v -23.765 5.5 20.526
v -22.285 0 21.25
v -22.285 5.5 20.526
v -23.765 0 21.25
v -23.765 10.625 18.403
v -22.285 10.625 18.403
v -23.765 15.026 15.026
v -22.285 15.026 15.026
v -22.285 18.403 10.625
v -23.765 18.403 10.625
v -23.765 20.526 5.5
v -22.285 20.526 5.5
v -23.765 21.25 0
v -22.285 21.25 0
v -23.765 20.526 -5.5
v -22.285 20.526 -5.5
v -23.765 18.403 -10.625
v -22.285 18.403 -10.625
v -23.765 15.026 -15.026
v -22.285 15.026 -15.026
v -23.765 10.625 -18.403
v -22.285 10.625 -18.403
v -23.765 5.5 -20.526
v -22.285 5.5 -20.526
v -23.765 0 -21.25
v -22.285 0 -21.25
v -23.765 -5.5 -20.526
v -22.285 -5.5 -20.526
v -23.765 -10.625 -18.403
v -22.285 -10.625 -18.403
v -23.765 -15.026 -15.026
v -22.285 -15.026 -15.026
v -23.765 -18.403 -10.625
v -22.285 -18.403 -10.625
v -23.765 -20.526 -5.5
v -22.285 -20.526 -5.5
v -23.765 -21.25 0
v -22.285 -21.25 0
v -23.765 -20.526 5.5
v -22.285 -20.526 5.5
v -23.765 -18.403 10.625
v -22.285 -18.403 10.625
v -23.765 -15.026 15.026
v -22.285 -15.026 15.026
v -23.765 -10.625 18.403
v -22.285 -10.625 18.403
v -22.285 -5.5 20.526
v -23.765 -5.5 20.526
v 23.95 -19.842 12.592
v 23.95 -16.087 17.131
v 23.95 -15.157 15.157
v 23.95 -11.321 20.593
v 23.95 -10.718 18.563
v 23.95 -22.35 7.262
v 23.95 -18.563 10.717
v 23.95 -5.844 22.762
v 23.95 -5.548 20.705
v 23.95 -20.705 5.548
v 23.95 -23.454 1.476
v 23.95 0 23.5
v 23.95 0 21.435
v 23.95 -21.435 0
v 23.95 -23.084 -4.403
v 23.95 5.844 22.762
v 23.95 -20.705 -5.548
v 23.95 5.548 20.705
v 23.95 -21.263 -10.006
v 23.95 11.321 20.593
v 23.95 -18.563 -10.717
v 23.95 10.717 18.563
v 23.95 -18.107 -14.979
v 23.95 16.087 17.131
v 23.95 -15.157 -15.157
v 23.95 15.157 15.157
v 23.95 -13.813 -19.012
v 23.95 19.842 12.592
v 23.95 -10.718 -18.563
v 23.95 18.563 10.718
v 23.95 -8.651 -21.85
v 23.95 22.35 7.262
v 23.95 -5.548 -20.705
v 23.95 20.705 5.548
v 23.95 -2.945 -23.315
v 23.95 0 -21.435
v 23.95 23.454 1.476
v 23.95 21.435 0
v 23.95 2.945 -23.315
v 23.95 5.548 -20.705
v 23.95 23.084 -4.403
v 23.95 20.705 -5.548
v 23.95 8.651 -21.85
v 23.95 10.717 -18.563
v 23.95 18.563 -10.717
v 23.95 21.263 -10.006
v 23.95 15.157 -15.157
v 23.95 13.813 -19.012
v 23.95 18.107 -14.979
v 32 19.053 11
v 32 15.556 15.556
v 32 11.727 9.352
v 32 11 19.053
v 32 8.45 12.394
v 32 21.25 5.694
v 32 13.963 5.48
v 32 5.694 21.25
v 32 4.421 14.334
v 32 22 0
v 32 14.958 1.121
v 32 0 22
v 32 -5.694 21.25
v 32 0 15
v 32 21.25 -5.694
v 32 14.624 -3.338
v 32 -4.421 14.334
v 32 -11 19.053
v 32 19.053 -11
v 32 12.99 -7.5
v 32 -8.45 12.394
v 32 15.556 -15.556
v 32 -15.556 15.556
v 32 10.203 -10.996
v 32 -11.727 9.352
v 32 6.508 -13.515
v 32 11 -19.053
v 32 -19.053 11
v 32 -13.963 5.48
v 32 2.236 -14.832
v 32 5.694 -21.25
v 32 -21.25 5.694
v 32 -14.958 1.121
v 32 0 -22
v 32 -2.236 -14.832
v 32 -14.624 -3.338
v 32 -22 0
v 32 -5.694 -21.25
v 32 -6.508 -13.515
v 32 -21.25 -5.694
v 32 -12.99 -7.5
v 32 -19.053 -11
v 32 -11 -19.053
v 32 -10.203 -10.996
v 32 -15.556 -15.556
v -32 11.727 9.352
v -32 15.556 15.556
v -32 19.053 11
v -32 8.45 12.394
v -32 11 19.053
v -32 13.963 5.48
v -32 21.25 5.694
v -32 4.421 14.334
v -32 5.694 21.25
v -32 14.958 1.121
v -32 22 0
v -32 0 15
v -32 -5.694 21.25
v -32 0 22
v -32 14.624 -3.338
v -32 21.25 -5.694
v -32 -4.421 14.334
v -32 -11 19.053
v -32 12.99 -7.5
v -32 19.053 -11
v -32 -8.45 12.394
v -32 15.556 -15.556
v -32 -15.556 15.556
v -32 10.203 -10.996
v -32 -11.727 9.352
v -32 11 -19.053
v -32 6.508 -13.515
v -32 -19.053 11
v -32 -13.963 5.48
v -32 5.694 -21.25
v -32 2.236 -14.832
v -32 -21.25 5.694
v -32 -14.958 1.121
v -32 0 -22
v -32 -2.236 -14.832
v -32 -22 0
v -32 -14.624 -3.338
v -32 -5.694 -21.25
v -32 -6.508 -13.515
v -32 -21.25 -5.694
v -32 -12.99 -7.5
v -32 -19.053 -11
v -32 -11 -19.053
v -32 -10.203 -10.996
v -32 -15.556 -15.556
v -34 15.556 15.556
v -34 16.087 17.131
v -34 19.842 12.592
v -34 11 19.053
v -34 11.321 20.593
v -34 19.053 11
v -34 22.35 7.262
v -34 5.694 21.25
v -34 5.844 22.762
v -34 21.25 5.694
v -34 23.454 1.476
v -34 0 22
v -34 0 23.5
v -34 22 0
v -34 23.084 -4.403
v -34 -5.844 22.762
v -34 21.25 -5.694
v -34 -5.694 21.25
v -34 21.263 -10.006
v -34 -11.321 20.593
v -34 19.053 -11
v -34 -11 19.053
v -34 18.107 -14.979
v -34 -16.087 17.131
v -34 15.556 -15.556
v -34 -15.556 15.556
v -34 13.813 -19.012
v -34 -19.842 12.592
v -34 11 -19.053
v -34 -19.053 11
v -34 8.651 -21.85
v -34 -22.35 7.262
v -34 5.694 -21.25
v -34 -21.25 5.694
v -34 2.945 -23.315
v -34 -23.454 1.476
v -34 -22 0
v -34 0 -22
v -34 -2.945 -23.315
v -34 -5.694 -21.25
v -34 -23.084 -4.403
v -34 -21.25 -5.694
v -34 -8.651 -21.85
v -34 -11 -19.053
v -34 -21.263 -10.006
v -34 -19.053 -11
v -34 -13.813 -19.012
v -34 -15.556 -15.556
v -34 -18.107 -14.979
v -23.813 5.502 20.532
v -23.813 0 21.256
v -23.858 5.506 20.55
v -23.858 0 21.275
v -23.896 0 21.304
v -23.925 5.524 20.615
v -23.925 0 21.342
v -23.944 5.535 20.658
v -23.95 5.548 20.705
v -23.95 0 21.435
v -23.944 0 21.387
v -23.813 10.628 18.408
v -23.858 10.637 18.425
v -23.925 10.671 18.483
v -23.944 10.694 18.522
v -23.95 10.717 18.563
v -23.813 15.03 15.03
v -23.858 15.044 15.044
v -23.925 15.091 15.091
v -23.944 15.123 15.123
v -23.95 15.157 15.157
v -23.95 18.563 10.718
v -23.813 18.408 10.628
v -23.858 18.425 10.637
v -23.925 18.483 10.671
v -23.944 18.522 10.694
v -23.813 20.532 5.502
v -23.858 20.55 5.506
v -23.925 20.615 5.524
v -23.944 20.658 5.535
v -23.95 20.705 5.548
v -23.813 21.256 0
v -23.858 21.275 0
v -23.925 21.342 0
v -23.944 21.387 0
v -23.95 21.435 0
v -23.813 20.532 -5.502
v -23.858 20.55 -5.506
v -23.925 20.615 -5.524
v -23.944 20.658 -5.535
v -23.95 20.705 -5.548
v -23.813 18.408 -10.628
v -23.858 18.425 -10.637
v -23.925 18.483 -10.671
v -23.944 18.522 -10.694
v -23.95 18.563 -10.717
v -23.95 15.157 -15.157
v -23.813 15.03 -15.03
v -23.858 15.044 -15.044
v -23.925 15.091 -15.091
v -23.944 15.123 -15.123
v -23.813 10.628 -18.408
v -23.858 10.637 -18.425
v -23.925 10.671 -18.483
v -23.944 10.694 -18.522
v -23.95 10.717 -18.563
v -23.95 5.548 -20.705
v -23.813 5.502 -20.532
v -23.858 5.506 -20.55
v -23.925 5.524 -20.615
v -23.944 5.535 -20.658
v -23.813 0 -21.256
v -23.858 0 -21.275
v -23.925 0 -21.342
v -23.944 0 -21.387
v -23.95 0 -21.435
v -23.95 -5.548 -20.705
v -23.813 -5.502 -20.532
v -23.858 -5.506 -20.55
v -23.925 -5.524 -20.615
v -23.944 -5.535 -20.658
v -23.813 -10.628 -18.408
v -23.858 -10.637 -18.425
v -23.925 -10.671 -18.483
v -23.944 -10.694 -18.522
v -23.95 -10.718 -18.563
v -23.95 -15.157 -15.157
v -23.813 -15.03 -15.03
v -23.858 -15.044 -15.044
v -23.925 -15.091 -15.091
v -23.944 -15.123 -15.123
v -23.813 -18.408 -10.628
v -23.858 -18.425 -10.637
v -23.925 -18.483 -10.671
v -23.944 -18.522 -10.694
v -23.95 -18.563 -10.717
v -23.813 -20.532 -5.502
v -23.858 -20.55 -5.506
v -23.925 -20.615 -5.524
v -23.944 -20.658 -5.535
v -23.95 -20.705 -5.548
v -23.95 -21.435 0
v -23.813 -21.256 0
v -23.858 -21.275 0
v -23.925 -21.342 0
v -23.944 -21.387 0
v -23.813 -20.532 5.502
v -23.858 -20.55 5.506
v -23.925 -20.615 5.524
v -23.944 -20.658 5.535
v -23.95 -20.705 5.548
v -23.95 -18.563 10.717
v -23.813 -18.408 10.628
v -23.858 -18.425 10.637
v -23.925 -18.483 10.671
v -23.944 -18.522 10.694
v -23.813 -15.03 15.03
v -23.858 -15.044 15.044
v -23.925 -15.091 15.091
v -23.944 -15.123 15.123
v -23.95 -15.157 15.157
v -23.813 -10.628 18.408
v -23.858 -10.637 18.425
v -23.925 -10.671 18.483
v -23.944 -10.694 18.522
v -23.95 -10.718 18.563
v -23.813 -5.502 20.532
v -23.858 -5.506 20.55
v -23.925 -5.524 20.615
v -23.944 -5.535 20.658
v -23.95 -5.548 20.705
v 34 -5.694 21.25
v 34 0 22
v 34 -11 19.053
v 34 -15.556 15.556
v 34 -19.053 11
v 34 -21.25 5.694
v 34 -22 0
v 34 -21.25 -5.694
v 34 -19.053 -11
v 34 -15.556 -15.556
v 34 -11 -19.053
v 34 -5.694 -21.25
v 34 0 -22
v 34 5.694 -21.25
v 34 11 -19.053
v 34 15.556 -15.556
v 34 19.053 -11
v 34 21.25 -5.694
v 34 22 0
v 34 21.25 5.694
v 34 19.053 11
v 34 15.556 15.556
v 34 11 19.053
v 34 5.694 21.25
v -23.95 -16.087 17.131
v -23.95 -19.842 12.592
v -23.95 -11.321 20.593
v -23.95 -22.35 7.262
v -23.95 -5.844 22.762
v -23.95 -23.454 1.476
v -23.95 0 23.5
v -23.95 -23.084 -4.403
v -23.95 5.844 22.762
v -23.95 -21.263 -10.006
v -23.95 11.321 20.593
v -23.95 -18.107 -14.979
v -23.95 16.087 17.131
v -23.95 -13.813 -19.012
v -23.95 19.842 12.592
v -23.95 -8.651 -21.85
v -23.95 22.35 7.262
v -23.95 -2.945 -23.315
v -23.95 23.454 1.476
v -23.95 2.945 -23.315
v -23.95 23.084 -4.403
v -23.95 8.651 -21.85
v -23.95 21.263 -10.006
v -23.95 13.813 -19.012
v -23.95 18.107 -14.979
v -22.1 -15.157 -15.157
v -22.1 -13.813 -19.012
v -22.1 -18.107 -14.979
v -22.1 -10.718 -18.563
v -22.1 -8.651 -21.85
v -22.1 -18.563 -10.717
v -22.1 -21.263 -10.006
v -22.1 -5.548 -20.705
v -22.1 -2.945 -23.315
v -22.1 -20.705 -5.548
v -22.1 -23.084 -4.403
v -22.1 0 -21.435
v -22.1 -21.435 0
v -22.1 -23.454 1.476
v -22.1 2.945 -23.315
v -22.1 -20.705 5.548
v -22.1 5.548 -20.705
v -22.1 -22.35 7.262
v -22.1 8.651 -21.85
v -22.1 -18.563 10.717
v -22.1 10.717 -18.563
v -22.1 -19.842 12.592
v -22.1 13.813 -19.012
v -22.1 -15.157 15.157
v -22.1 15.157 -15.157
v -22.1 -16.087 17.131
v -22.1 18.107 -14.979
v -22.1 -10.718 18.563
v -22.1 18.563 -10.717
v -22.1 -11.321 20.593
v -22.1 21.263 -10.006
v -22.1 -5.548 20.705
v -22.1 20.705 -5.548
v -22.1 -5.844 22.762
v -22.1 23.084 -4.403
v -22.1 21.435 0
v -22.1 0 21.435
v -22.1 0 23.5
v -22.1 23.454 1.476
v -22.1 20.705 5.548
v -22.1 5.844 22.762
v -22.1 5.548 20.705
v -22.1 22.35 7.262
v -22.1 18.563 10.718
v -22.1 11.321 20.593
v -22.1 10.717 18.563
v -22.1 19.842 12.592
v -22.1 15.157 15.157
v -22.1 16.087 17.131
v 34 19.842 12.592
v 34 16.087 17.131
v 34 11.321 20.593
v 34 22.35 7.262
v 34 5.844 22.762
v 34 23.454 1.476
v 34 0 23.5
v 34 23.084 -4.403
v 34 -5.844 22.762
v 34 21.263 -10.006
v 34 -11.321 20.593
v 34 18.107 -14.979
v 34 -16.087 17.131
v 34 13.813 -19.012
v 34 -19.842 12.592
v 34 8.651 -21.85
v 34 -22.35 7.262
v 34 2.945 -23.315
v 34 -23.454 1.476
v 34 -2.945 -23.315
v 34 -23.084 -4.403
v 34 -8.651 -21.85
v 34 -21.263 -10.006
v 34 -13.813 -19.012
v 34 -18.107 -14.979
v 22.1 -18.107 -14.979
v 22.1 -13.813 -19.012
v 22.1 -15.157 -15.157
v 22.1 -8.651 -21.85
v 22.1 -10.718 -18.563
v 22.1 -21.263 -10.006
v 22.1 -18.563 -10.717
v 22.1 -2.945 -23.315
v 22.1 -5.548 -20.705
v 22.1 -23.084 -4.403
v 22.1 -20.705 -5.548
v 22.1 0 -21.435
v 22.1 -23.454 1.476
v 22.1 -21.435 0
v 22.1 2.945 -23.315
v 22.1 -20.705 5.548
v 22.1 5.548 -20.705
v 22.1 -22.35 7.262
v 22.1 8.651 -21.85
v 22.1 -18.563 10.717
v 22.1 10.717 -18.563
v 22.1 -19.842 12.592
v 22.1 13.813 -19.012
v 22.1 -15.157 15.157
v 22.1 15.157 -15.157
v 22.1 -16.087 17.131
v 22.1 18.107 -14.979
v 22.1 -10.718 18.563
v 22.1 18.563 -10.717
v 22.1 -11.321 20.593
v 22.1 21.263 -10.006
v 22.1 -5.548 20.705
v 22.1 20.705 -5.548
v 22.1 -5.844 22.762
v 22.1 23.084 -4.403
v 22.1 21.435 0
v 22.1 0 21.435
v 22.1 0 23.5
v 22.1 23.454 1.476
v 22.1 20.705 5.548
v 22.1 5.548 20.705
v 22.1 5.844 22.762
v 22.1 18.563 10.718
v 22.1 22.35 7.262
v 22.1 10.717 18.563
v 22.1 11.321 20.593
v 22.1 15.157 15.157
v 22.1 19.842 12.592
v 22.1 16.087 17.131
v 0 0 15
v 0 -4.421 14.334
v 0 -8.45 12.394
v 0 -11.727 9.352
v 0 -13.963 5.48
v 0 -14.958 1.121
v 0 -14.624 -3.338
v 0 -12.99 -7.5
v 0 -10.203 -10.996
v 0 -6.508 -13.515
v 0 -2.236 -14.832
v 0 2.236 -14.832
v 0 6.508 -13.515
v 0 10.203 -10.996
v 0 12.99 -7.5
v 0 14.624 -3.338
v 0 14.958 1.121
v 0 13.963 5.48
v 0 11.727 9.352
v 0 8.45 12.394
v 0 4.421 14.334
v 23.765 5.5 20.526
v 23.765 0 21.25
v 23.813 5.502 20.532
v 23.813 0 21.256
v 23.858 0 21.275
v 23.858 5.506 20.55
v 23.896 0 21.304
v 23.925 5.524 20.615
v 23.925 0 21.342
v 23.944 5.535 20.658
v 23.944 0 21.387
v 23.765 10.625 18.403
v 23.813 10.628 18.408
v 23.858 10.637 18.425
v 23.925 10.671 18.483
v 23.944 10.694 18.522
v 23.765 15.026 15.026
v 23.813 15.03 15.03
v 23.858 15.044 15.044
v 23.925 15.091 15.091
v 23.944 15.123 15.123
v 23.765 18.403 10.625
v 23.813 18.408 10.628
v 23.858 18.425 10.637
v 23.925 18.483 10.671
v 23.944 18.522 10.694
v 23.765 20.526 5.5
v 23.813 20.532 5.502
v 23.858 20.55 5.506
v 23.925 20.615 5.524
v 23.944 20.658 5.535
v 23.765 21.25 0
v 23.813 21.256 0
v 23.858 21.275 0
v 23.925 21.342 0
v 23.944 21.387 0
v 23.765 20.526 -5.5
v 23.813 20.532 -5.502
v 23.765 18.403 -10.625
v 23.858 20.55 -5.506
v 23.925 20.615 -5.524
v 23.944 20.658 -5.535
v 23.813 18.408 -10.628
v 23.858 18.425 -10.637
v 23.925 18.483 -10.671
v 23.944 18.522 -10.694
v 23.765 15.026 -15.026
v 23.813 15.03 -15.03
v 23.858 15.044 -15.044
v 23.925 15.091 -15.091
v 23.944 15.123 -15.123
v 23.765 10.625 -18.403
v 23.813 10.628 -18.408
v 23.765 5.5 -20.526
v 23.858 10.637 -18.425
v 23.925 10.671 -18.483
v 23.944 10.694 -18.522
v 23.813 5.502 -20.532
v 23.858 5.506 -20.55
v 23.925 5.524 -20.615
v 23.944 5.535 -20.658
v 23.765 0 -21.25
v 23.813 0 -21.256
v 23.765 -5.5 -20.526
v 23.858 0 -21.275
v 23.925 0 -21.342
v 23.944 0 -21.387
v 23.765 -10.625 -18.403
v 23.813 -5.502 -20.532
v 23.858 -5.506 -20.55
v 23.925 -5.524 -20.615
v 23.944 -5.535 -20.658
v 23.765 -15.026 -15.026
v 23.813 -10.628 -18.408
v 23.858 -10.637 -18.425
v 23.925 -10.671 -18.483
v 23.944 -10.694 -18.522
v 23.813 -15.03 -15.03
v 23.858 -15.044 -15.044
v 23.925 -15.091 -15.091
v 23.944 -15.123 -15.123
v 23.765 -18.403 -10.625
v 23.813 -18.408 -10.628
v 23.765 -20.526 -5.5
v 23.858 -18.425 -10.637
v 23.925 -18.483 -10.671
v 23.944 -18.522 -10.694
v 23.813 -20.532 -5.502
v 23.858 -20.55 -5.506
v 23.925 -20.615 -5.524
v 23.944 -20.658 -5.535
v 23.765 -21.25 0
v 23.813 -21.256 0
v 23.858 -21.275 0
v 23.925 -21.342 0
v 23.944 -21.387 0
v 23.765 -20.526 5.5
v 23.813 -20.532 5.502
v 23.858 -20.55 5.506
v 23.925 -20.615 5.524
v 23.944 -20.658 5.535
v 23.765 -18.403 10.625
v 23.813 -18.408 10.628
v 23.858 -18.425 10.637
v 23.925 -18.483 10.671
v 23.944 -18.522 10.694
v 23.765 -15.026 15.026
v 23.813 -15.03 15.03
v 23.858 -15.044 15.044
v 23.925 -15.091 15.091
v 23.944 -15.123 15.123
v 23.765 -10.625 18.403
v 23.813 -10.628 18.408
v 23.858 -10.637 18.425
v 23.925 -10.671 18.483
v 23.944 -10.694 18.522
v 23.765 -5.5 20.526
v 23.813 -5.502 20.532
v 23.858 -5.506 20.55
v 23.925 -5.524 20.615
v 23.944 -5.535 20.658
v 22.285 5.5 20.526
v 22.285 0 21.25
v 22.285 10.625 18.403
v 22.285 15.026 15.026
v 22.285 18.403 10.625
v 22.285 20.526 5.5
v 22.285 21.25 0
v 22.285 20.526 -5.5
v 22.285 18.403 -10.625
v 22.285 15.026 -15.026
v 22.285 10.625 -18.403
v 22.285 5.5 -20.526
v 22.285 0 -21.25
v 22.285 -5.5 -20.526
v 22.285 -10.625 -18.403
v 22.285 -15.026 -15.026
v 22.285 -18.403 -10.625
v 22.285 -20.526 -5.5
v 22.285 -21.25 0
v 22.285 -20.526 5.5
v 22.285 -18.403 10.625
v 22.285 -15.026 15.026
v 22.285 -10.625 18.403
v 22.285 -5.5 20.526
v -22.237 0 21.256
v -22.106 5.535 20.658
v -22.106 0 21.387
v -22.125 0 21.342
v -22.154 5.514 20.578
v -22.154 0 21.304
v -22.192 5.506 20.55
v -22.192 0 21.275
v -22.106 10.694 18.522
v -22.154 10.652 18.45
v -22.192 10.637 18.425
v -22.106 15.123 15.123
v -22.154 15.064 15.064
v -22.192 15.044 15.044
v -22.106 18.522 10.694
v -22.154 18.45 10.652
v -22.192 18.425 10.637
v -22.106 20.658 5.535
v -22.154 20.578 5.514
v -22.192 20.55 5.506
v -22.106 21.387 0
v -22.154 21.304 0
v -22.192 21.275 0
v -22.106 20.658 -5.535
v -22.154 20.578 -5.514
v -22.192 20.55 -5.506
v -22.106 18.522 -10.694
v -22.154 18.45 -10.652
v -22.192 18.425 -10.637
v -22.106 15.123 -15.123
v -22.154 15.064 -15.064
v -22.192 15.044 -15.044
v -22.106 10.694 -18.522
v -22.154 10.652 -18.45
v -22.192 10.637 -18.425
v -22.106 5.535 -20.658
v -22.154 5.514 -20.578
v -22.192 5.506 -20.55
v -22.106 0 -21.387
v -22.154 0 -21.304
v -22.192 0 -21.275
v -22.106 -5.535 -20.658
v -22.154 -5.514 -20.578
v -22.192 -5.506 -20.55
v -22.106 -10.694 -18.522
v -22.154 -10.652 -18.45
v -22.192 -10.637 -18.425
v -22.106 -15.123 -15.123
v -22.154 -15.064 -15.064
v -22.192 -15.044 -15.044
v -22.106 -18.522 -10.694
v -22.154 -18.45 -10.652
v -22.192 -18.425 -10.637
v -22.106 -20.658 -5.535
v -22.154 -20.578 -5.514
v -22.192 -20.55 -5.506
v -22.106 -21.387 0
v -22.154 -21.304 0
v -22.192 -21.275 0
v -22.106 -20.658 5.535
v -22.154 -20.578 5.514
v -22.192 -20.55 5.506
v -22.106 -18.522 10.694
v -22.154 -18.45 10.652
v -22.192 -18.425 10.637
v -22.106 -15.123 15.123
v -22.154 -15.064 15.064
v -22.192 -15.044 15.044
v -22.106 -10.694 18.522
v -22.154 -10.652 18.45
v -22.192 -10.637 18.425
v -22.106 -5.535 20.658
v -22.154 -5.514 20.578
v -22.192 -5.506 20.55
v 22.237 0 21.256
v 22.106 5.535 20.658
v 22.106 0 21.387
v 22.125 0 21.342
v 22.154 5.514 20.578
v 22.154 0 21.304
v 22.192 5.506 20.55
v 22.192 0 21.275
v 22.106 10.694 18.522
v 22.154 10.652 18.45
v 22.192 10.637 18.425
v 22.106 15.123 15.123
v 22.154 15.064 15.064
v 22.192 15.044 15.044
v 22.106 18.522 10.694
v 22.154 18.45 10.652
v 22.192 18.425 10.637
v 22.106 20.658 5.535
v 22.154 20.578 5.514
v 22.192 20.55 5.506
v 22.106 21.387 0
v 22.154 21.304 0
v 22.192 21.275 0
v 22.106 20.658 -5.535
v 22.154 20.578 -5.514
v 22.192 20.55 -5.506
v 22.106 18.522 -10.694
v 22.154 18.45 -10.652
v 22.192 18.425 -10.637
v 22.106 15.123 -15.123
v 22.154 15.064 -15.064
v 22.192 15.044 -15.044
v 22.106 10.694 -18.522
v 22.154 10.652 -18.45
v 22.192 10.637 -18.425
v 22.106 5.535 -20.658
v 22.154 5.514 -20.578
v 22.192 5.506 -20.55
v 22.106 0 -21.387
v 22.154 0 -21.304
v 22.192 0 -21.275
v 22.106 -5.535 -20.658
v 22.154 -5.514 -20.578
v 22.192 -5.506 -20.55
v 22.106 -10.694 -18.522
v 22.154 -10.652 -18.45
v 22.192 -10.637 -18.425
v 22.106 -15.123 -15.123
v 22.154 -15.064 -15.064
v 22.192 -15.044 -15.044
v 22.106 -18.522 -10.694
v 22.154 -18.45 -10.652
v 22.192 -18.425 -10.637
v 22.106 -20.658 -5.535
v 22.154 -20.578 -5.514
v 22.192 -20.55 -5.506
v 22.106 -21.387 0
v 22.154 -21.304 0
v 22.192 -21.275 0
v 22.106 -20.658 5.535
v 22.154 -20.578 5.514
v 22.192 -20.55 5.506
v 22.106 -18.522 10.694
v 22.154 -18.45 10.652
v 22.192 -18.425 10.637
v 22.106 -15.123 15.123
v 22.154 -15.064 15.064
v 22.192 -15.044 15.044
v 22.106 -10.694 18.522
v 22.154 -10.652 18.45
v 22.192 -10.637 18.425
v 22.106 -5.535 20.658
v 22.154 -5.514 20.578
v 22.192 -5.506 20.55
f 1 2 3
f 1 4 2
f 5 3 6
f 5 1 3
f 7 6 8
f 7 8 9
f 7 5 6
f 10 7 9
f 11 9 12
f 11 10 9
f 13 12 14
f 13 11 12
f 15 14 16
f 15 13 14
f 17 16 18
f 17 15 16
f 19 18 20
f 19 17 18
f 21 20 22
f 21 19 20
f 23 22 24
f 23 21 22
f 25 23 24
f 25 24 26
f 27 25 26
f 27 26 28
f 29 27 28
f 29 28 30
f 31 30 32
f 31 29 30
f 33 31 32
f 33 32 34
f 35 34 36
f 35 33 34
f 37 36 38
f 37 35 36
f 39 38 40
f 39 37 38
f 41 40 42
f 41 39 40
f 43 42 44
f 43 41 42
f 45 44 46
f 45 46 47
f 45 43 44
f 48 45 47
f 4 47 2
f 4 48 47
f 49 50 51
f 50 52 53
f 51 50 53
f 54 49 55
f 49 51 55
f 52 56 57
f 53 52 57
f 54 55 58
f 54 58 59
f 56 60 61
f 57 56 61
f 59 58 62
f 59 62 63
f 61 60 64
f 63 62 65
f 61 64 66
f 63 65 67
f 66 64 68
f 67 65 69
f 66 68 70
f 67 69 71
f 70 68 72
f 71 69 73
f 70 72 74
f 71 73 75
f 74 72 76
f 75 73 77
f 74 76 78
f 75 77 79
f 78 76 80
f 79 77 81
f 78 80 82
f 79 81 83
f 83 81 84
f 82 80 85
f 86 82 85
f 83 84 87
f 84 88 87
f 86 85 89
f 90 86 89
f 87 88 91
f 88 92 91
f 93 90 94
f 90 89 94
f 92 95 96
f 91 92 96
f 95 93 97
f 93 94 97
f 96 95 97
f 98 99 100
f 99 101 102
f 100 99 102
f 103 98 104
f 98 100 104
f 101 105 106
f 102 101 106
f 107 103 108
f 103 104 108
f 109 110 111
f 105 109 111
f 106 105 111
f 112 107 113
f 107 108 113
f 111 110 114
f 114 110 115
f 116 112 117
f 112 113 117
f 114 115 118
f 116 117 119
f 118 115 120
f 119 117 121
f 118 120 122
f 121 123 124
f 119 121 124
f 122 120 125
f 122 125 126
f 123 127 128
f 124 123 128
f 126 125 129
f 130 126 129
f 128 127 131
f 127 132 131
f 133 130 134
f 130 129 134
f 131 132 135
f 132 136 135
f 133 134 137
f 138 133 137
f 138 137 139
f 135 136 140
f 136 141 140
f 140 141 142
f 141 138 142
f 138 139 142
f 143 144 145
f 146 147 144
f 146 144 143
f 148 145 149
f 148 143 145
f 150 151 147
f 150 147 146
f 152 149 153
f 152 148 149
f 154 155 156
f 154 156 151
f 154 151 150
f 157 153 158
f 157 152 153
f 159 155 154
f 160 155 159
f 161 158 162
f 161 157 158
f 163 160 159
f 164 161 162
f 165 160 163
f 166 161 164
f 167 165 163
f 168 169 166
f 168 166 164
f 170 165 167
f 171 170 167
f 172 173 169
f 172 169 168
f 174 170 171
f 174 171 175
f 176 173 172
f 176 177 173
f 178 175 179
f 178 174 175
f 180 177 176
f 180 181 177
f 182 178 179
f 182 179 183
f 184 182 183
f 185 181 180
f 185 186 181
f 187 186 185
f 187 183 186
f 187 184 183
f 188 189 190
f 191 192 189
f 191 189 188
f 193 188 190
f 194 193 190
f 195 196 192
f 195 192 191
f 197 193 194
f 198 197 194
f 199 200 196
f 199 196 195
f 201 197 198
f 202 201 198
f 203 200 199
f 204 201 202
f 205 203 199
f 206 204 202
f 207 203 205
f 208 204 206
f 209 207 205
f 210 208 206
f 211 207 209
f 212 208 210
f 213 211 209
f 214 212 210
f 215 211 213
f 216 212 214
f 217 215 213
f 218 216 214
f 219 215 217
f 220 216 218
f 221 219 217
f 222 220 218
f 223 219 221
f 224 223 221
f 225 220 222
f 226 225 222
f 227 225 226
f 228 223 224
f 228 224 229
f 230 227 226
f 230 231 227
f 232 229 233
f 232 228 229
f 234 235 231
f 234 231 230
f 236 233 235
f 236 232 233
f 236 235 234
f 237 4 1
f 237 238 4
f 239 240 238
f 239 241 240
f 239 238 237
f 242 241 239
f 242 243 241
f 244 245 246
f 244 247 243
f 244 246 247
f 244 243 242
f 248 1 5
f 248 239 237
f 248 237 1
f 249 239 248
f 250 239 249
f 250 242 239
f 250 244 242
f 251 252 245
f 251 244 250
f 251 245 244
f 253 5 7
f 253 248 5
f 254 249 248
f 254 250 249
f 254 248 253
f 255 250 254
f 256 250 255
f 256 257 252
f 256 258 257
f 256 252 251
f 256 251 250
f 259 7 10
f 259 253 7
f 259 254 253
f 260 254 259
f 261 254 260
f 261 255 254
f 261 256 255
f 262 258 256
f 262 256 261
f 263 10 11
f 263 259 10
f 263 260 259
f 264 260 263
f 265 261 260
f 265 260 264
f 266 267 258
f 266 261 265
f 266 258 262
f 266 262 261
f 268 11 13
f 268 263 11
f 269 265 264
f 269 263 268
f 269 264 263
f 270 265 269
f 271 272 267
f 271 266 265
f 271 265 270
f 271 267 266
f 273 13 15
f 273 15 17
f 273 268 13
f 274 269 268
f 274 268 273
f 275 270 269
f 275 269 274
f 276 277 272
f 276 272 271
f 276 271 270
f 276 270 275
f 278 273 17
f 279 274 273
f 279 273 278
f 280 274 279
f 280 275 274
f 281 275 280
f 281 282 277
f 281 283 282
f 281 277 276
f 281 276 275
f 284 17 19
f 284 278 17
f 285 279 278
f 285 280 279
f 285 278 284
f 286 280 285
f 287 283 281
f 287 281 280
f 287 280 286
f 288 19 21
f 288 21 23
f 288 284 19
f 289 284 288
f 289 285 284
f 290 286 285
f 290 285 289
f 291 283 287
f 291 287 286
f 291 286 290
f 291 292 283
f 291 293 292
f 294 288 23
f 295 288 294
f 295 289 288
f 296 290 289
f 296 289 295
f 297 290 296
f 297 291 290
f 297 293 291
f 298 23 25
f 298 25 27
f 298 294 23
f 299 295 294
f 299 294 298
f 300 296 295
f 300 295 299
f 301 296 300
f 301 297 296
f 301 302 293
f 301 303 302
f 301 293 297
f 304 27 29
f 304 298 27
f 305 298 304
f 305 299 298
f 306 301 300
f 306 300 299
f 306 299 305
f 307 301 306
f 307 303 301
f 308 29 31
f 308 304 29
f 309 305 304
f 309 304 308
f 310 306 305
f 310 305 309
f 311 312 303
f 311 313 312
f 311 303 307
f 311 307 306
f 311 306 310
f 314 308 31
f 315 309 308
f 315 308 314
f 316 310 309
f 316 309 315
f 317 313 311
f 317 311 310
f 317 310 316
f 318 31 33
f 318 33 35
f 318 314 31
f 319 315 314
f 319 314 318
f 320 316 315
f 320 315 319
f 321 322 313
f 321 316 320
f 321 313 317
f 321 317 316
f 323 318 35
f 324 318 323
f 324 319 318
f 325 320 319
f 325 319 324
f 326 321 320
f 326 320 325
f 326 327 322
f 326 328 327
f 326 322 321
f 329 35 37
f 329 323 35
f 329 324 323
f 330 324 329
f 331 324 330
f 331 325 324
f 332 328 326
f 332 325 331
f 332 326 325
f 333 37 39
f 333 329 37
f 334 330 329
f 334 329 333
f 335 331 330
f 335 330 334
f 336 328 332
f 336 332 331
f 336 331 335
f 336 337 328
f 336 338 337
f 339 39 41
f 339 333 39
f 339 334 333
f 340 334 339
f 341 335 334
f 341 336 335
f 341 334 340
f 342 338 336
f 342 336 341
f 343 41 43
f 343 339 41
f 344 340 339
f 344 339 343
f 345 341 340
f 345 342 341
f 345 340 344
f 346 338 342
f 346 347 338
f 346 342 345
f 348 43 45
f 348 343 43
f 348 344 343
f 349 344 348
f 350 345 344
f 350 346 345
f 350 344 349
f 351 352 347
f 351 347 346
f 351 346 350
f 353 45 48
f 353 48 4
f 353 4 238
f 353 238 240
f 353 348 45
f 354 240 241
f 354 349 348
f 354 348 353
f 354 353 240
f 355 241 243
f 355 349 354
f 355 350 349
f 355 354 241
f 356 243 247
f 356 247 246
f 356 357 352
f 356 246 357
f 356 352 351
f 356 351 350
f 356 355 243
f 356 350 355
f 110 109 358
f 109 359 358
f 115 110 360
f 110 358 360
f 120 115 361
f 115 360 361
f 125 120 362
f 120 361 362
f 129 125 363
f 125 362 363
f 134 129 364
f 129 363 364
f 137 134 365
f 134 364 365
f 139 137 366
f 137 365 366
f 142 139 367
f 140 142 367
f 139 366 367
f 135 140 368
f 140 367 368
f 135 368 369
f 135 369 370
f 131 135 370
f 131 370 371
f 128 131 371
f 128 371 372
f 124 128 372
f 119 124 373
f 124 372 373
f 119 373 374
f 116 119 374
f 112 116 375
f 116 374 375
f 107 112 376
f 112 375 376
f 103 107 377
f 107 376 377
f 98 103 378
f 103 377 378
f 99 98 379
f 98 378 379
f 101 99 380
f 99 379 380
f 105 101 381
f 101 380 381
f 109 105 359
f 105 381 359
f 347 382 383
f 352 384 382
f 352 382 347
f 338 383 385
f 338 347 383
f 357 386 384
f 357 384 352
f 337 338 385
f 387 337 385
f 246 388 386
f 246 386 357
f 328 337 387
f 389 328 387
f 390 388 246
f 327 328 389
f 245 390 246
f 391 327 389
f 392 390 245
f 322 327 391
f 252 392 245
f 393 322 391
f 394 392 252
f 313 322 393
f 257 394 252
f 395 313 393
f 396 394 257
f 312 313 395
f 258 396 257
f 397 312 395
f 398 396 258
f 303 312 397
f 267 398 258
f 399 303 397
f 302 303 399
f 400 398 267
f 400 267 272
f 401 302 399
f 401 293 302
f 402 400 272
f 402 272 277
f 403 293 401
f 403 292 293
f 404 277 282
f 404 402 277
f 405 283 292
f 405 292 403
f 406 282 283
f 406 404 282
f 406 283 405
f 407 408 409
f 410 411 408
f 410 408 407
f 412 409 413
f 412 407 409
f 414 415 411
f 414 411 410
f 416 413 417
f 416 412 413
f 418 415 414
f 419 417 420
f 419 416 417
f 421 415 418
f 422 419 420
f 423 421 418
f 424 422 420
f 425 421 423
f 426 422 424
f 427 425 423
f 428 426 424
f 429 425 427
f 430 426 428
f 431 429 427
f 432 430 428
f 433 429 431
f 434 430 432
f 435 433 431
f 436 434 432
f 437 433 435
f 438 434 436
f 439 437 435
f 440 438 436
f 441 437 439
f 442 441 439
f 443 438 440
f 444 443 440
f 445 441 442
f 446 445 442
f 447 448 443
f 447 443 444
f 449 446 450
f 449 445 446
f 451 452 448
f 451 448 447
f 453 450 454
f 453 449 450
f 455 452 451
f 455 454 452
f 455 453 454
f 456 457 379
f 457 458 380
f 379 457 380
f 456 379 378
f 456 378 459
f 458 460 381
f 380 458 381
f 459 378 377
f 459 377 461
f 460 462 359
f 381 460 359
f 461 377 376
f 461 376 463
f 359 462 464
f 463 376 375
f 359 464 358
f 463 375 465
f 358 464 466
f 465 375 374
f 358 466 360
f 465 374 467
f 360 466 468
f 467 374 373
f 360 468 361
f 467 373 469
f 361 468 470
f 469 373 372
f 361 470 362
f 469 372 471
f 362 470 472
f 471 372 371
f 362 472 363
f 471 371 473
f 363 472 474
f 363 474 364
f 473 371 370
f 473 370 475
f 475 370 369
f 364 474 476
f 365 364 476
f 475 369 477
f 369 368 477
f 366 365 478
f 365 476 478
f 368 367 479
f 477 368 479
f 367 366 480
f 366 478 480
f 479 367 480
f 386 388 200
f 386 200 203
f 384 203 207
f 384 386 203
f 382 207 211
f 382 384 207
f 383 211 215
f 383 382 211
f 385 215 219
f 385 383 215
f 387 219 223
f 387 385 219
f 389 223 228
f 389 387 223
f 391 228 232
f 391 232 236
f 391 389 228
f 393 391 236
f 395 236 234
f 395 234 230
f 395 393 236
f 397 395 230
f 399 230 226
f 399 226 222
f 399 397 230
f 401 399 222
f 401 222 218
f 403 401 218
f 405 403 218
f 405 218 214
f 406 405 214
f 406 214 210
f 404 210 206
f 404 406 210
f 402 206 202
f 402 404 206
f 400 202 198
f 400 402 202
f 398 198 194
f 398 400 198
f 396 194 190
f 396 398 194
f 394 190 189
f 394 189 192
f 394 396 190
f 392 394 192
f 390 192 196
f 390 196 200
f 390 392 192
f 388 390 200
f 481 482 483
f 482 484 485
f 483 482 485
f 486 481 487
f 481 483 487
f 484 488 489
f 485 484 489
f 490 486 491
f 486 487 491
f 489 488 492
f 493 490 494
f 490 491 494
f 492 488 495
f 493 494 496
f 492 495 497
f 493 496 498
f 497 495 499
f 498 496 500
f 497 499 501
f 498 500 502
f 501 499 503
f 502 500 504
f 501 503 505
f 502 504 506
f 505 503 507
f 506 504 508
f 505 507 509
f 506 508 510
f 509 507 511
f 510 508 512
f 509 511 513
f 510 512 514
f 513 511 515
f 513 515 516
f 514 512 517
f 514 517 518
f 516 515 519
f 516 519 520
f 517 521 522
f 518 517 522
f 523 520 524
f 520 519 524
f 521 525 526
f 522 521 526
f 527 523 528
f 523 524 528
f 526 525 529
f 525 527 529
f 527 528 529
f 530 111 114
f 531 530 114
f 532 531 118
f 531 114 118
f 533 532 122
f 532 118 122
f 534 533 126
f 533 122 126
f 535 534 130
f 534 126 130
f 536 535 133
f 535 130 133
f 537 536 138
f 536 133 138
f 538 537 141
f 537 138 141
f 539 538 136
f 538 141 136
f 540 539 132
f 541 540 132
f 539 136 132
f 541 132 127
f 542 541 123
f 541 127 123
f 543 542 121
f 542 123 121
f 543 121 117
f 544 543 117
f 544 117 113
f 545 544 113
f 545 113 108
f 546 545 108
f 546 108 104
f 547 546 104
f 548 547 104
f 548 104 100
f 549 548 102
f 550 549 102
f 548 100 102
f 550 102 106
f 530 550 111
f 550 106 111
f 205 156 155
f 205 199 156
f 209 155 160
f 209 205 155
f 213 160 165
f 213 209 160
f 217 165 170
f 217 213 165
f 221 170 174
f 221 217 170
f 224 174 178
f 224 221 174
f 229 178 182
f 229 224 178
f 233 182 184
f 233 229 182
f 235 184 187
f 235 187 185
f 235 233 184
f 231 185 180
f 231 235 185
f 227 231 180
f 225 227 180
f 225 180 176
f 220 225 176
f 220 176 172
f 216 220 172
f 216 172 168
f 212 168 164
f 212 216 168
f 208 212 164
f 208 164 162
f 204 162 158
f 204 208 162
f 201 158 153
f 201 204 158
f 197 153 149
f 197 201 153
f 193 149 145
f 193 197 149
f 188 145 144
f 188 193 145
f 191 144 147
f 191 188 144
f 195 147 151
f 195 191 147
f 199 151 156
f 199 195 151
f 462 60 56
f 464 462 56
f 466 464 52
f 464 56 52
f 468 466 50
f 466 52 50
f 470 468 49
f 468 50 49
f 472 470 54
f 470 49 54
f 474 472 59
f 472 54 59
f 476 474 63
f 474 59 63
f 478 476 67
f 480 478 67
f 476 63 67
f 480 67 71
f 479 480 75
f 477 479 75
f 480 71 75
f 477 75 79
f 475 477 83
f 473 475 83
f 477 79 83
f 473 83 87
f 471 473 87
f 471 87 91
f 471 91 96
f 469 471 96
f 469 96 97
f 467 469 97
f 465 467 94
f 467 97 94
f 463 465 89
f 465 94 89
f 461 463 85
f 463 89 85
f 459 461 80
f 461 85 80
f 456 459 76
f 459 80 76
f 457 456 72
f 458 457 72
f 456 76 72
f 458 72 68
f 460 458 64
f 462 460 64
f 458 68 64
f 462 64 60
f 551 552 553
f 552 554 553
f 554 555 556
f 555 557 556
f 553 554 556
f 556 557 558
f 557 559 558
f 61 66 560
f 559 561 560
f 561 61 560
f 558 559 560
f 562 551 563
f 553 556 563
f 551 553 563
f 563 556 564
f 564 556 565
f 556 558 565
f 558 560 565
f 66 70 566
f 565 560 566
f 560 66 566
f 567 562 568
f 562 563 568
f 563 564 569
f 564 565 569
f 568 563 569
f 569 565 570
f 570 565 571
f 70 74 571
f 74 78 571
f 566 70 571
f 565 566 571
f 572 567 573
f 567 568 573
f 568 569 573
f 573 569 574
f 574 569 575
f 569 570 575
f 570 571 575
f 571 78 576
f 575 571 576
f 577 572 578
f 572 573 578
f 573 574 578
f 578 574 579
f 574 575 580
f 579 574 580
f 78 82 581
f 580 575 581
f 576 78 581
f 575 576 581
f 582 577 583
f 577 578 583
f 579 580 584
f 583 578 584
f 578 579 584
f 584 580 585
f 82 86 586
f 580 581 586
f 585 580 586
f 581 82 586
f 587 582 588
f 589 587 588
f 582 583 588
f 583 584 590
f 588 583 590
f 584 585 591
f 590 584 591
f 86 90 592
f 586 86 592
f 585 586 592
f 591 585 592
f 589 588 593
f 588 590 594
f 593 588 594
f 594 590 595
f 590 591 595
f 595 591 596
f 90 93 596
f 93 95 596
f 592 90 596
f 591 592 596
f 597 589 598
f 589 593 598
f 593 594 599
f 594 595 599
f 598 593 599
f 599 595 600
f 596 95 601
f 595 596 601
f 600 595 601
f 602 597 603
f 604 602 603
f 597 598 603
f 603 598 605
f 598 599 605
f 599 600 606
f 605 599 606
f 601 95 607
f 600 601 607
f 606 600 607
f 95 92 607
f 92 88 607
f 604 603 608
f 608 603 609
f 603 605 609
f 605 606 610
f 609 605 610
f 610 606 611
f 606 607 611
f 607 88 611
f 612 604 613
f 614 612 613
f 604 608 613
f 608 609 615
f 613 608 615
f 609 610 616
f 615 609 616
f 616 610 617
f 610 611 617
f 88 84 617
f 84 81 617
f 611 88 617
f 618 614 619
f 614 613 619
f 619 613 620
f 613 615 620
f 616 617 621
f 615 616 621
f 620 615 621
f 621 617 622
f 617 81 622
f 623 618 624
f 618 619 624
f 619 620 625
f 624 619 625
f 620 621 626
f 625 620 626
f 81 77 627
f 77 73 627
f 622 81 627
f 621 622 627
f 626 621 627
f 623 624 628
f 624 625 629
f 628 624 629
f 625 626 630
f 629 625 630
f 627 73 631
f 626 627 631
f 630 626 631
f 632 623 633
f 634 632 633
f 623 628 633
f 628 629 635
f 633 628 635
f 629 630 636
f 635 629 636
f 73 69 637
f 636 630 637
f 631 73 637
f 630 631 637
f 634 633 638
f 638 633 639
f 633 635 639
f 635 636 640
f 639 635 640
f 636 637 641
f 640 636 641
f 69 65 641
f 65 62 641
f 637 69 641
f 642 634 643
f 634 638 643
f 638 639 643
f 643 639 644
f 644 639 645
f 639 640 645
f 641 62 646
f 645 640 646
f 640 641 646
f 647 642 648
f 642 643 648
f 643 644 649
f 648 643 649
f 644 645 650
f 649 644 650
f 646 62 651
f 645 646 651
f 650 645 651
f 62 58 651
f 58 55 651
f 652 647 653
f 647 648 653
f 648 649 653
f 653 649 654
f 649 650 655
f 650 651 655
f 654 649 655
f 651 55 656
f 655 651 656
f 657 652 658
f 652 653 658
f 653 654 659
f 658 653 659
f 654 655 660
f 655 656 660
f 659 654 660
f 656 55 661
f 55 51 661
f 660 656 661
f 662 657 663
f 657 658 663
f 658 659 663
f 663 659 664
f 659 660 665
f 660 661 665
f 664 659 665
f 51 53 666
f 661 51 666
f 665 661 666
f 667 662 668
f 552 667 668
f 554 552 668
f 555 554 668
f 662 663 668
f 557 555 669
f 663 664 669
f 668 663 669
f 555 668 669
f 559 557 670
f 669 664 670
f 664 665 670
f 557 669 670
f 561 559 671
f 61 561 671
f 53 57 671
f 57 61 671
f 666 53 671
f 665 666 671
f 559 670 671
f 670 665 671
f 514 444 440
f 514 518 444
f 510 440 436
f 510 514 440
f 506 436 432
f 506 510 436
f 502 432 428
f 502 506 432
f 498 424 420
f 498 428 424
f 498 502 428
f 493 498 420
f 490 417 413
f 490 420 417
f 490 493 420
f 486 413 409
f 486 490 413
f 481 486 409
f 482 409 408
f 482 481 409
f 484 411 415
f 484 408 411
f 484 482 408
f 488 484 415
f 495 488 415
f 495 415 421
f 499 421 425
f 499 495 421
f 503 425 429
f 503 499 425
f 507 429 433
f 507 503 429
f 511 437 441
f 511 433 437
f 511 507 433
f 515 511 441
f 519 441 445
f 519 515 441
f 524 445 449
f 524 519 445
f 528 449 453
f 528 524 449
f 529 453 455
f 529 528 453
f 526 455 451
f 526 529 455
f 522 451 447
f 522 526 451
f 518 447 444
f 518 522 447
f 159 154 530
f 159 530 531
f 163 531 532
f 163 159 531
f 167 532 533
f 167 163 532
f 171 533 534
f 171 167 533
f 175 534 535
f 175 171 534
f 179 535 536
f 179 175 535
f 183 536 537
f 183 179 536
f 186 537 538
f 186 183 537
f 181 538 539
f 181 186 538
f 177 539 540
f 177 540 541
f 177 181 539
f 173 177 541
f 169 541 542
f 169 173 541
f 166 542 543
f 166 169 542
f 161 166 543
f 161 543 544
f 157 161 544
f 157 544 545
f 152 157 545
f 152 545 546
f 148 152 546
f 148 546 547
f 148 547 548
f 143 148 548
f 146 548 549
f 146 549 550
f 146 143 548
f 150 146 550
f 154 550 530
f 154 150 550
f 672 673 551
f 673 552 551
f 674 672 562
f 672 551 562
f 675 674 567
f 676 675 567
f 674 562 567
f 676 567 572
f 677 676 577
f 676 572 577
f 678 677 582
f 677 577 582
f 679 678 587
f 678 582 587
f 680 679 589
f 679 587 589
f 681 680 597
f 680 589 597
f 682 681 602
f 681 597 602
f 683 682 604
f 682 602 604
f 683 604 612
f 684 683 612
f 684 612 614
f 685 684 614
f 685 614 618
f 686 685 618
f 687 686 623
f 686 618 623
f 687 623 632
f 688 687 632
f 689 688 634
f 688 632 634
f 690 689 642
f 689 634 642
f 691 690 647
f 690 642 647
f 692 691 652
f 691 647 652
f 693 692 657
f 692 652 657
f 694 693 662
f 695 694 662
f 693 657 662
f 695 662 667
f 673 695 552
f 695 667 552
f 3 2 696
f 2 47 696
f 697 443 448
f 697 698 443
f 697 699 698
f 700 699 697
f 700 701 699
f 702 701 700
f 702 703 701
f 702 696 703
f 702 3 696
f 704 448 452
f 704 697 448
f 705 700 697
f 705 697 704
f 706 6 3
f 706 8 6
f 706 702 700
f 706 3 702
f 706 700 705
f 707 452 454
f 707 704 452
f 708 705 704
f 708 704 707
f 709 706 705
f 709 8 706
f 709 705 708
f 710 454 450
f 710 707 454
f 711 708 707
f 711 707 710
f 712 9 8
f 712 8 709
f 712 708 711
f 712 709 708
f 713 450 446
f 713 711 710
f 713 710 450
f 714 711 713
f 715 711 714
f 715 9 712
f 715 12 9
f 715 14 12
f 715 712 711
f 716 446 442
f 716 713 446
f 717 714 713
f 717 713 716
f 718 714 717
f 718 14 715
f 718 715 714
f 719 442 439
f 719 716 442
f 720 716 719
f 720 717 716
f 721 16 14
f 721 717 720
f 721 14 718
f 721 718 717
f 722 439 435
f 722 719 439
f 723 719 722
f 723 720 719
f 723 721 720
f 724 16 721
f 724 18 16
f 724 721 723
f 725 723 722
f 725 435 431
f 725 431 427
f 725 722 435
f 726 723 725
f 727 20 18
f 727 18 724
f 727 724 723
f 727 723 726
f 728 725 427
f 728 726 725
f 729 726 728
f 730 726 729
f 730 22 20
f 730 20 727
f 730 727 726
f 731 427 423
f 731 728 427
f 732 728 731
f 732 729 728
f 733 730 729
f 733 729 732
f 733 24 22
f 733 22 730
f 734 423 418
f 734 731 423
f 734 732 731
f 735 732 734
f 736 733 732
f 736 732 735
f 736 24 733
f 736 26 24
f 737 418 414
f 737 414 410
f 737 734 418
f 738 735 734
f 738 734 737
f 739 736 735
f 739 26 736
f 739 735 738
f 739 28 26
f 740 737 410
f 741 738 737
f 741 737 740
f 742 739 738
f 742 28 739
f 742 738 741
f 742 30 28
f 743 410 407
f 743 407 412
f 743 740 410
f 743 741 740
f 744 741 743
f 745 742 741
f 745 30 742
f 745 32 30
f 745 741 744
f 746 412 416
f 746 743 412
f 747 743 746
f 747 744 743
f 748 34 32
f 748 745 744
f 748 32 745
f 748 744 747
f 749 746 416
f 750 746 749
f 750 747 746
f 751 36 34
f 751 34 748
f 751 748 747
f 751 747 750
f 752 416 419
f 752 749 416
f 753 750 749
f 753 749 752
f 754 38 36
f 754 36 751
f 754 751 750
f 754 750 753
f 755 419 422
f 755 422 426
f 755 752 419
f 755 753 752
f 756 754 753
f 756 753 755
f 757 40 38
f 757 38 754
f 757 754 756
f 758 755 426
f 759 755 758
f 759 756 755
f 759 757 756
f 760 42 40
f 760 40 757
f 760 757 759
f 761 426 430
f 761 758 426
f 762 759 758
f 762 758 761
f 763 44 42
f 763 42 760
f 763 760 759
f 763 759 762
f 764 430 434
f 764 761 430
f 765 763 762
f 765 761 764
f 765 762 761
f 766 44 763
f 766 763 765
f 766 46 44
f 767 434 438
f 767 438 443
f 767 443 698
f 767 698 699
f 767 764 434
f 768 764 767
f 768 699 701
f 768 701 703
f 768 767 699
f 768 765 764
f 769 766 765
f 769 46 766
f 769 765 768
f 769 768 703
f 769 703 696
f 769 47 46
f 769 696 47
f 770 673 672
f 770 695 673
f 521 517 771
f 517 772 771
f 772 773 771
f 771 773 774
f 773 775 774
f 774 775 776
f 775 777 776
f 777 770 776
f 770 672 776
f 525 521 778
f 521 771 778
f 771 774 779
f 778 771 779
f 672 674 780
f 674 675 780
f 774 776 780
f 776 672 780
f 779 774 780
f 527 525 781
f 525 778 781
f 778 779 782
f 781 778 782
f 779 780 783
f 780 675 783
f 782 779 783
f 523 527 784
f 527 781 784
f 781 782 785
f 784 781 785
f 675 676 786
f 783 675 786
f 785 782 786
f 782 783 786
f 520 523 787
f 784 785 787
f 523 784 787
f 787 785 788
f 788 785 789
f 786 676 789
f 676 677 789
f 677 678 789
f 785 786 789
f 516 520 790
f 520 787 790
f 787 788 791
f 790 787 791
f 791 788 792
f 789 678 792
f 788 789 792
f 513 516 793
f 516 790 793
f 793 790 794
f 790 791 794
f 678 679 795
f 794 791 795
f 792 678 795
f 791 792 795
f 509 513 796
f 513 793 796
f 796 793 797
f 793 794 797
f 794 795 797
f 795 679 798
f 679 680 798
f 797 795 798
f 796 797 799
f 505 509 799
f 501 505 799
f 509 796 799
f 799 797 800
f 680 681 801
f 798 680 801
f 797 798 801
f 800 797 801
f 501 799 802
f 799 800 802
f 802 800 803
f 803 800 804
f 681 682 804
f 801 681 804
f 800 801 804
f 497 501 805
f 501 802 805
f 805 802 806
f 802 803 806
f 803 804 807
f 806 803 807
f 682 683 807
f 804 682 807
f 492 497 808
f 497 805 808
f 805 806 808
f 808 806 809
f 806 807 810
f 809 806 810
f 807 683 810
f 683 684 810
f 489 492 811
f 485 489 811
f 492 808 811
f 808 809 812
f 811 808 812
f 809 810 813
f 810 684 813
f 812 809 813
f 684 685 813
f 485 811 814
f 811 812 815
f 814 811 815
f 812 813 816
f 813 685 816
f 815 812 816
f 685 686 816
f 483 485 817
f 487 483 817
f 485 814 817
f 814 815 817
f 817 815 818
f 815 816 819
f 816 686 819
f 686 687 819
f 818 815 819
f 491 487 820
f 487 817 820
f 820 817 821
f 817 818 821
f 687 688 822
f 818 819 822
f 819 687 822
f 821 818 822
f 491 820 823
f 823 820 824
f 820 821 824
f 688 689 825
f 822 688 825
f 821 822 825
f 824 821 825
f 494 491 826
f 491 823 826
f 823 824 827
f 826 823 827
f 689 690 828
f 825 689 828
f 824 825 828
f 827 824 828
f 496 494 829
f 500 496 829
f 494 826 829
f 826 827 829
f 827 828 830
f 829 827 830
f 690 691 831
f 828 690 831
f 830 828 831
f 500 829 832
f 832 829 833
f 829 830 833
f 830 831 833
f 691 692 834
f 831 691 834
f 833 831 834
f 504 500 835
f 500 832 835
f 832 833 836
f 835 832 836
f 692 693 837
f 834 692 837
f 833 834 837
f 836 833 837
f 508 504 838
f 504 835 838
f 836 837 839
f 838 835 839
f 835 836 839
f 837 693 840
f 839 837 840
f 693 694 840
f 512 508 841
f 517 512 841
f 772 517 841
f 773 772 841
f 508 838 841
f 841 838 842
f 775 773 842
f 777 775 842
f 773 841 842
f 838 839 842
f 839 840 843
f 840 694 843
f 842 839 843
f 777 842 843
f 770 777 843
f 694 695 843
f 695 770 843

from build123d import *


with BuildPart() as part:
    # Sketch1 → Revolve1 (revolve)
    with BuildSketch(Plane(origin=(0, 0, 0), x_dir=(1, 0, 0), z_dir=(0, 1, 0)), mode=Mode.PRIVATE) as revolve1_sk:
        Polygon((0, 23.5), (0, 15), (32, 15), (32, 22), (34, 22), (34, 23.5), align=None)
    revolve(revolve1_sk.sketch.rotate(Axis((0, 0, 0), (1, 0, 0)), 180), axis=Axis((0, 0, 0), (1, 0, 0)))

    # Sketch7 → Groove for DIN 471 - 45 x 1.75, Circlip for shafts - normal1 (revolve, cut)
    with BuildSketch(Plane(origin=(0, 0, 0), x_dir=(0, 0, 1), z_dir=(0, -1, 0))):
        with BuildLine():
            Line((21.435, -23.95), (28.2, -23.95))
            Line((28.2, -23.95), (28.2, -22.1))
            Line((28.2, -22.1), (21.435, -22.1))
            ThreePointArc((21.435, -22.1), (21.304185245, -22.154185245), (21.25, -22.285))
            Line((21.25, -22.285), (21.25, -23.765))
            ThreePointArc((21.25, -23.765), (21.304185245, -23.895814755), (21.435, -23.95))
        make_face()
    revolve(axis=Axis((50, 0, 0), (-1, 0, 0)), mode=Mode.SUBTRACT)

    # Mirror2: part across plane


with BuildPart() as part_1:
    add(part.part)
    add(part.part.mirror(Plane.ZY))


solid = part_1.part
